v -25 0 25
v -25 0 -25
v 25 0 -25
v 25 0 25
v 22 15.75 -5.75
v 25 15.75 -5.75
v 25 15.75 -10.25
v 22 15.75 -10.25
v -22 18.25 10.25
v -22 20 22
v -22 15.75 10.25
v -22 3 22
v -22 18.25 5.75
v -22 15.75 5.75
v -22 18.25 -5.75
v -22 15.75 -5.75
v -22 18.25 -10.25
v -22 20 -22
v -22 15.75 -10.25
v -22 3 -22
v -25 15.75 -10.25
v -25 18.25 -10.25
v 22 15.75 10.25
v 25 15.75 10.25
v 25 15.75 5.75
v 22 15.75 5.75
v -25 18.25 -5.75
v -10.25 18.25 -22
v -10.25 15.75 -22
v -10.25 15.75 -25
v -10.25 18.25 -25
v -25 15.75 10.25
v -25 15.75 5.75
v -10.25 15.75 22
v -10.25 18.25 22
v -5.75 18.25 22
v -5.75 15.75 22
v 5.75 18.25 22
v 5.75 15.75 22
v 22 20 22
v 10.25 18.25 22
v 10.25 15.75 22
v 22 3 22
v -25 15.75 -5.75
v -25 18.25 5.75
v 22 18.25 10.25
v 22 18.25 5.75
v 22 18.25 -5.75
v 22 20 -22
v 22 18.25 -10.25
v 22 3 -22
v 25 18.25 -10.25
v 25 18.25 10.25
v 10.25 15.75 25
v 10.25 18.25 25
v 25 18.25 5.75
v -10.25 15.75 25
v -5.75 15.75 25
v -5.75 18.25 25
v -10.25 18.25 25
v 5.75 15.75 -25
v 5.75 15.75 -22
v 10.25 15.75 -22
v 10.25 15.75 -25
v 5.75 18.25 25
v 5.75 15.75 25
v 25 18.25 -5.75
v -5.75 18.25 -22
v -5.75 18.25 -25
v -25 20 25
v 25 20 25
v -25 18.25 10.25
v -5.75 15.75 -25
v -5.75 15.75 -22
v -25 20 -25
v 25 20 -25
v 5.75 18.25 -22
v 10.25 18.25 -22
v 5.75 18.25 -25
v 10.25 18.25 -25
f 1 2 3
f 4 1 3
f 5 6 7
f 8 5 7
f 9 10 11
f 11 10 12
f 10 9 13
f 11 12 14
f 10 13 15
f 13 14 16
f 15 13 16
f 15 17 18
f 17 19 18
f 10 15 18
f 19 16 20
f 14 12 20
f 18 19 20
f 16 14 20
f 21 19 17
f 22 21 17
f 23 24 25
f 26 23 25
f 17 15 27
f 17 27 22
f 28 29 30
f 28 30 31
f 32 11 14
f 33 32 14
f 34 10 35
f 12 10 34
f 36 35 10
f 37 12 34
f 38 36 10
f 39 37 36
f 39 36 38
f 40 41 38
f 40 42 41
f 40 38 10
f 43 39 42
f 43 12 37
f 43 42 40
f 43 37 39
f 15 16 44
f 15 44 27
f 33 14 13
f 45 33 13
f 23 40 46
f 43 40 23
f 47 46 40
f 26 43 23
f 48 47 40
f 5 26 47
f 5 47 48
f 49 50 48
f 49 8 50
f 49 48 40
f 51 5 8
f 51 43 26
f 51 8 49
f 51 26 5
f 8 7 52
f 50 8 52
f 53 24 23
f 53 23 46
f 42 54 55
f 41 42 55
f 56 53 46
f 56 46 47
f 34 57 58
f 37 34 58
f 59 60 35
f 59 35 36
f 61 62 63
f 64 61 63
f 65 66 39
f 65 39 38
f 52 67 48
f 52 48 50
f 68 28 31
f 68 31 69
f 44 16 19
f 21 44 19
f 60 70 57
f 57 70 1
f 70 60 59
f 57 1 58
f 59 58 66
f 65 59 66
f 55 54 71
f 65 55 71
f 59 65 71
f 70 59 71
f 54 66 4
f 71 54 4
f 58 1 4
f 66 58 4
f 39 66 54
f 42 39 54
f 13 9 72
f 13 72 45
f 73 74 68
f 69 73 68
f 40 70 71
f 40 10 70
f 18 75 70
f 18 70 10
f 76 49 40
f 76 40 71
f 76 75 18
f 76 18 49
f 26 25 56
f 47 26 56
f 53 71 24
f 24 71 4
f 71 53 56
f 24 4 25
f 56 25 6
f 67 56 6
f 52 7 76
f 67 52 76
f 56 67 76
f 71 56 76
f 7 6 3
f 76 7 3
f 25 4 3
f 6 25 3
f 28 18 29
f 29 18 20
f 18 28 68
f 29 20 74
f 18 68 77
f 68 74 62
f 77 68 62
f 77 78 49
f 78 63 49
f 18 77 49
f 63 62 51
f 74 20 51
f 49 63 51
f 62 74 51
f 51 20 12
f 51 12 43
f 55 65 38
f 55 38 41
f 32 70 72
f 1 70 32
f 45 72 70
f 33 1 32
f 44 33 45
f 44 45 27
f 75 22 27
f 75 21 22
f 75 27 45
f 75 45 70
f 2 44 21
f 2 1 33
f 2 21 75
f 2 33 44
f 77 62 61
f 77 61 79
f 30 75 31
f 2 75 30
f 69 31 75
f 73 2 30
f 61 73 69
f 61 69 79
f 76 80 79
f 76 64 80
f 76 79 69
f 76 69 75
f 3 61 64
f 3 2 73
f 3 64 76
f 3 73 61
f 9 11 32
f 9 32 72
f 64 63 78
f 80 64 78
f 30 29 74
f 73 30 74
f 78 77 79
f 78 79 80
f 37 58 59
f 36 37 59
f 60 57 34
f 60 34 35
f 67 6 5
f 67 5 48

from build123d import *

# Parameters (mm, degrees)
SKETCH_1_W          = 50
SKETCH_1_H          = 50
EXTRUDE_1_DEPTH     = 3
SKETCH_2_W          = 50
SKETCH_2_H          = 50
SKETCH_2_W_2        = 44
SKETCH_2_H_2        = 44
EXTRUDE_2_DEPTH     = 17
SKETCH_3_W          = 4.5
SKETCH_3_H          = 2.5
CUT_EXTRUDE_1_DEPTH = 60.371710435
SKETCH_4_W          = 4.5
SKETCH_4_H          = 2.5
CUT_EXTRUDE_2_DEPTH = 60.371710435


with BuildPart() as part:
    # 草图1 → 凸台-拉伸1 (new body)
    with BuildSketch(Plane(origin=(0, 0, 0), x_dir=(1, 0, 0), z_dir=(0, 1, 0))):
        Rectangle(SKETCH_1_W, SKETCH_1_H)
    extrude(amount=EXTRUDE_1_DEPTH)

    # 草图2 → 凸台-拉伸2 (add)
    with BuildSketch(Plane(origin=(0, 3, 0), x_dir=(1, 0, 0), z_dir=(0, 1, 0))):
        Rectangle(SKETCH_2_W, SKETCH_2_H)
        Rectangle(SKETCH_2_W_2, SKETCH_2_H_2, mode=Mode.SUBTRACT)
    extrude(amount=EXTRUDE_2_DEPTH)

    # 草图3 → 切除-拉伸1 (cut, through all)
    with BuildSketch(Plane.XY.offset(25)):
        with Locations((-8, 17)):
            Rectangle(SKETCH_3_W, SKETCH_3_H)
        with Locations((8, 17)):
            Rectangle(SKETCH_3_W, SKETCH_3_H)
    extrude(amount=-CUT_EXTRUDE_1_DEPTH, mode=Mode.SUBTRACT)

    # 草图4 → 切除-拉伸2 (cut, through all)
    with BuildSketch(Plane(origin=(25, 0, 0), x_dir=(0, 0, -1), z_dir=(1, 0, 0))):
        with Locations((-8, 17)):
            Rectangle(SKETCH_4_W, SKETCH_4_H)
        with Locations((8, 17)):
            Rectangle(SKETCH_4_W, SKETCH_4_H)
    extrude(amount=-CUT_EXTRUDE_2_DEPTH, mode=Mode.SUBTRACT)


solid = part.part
